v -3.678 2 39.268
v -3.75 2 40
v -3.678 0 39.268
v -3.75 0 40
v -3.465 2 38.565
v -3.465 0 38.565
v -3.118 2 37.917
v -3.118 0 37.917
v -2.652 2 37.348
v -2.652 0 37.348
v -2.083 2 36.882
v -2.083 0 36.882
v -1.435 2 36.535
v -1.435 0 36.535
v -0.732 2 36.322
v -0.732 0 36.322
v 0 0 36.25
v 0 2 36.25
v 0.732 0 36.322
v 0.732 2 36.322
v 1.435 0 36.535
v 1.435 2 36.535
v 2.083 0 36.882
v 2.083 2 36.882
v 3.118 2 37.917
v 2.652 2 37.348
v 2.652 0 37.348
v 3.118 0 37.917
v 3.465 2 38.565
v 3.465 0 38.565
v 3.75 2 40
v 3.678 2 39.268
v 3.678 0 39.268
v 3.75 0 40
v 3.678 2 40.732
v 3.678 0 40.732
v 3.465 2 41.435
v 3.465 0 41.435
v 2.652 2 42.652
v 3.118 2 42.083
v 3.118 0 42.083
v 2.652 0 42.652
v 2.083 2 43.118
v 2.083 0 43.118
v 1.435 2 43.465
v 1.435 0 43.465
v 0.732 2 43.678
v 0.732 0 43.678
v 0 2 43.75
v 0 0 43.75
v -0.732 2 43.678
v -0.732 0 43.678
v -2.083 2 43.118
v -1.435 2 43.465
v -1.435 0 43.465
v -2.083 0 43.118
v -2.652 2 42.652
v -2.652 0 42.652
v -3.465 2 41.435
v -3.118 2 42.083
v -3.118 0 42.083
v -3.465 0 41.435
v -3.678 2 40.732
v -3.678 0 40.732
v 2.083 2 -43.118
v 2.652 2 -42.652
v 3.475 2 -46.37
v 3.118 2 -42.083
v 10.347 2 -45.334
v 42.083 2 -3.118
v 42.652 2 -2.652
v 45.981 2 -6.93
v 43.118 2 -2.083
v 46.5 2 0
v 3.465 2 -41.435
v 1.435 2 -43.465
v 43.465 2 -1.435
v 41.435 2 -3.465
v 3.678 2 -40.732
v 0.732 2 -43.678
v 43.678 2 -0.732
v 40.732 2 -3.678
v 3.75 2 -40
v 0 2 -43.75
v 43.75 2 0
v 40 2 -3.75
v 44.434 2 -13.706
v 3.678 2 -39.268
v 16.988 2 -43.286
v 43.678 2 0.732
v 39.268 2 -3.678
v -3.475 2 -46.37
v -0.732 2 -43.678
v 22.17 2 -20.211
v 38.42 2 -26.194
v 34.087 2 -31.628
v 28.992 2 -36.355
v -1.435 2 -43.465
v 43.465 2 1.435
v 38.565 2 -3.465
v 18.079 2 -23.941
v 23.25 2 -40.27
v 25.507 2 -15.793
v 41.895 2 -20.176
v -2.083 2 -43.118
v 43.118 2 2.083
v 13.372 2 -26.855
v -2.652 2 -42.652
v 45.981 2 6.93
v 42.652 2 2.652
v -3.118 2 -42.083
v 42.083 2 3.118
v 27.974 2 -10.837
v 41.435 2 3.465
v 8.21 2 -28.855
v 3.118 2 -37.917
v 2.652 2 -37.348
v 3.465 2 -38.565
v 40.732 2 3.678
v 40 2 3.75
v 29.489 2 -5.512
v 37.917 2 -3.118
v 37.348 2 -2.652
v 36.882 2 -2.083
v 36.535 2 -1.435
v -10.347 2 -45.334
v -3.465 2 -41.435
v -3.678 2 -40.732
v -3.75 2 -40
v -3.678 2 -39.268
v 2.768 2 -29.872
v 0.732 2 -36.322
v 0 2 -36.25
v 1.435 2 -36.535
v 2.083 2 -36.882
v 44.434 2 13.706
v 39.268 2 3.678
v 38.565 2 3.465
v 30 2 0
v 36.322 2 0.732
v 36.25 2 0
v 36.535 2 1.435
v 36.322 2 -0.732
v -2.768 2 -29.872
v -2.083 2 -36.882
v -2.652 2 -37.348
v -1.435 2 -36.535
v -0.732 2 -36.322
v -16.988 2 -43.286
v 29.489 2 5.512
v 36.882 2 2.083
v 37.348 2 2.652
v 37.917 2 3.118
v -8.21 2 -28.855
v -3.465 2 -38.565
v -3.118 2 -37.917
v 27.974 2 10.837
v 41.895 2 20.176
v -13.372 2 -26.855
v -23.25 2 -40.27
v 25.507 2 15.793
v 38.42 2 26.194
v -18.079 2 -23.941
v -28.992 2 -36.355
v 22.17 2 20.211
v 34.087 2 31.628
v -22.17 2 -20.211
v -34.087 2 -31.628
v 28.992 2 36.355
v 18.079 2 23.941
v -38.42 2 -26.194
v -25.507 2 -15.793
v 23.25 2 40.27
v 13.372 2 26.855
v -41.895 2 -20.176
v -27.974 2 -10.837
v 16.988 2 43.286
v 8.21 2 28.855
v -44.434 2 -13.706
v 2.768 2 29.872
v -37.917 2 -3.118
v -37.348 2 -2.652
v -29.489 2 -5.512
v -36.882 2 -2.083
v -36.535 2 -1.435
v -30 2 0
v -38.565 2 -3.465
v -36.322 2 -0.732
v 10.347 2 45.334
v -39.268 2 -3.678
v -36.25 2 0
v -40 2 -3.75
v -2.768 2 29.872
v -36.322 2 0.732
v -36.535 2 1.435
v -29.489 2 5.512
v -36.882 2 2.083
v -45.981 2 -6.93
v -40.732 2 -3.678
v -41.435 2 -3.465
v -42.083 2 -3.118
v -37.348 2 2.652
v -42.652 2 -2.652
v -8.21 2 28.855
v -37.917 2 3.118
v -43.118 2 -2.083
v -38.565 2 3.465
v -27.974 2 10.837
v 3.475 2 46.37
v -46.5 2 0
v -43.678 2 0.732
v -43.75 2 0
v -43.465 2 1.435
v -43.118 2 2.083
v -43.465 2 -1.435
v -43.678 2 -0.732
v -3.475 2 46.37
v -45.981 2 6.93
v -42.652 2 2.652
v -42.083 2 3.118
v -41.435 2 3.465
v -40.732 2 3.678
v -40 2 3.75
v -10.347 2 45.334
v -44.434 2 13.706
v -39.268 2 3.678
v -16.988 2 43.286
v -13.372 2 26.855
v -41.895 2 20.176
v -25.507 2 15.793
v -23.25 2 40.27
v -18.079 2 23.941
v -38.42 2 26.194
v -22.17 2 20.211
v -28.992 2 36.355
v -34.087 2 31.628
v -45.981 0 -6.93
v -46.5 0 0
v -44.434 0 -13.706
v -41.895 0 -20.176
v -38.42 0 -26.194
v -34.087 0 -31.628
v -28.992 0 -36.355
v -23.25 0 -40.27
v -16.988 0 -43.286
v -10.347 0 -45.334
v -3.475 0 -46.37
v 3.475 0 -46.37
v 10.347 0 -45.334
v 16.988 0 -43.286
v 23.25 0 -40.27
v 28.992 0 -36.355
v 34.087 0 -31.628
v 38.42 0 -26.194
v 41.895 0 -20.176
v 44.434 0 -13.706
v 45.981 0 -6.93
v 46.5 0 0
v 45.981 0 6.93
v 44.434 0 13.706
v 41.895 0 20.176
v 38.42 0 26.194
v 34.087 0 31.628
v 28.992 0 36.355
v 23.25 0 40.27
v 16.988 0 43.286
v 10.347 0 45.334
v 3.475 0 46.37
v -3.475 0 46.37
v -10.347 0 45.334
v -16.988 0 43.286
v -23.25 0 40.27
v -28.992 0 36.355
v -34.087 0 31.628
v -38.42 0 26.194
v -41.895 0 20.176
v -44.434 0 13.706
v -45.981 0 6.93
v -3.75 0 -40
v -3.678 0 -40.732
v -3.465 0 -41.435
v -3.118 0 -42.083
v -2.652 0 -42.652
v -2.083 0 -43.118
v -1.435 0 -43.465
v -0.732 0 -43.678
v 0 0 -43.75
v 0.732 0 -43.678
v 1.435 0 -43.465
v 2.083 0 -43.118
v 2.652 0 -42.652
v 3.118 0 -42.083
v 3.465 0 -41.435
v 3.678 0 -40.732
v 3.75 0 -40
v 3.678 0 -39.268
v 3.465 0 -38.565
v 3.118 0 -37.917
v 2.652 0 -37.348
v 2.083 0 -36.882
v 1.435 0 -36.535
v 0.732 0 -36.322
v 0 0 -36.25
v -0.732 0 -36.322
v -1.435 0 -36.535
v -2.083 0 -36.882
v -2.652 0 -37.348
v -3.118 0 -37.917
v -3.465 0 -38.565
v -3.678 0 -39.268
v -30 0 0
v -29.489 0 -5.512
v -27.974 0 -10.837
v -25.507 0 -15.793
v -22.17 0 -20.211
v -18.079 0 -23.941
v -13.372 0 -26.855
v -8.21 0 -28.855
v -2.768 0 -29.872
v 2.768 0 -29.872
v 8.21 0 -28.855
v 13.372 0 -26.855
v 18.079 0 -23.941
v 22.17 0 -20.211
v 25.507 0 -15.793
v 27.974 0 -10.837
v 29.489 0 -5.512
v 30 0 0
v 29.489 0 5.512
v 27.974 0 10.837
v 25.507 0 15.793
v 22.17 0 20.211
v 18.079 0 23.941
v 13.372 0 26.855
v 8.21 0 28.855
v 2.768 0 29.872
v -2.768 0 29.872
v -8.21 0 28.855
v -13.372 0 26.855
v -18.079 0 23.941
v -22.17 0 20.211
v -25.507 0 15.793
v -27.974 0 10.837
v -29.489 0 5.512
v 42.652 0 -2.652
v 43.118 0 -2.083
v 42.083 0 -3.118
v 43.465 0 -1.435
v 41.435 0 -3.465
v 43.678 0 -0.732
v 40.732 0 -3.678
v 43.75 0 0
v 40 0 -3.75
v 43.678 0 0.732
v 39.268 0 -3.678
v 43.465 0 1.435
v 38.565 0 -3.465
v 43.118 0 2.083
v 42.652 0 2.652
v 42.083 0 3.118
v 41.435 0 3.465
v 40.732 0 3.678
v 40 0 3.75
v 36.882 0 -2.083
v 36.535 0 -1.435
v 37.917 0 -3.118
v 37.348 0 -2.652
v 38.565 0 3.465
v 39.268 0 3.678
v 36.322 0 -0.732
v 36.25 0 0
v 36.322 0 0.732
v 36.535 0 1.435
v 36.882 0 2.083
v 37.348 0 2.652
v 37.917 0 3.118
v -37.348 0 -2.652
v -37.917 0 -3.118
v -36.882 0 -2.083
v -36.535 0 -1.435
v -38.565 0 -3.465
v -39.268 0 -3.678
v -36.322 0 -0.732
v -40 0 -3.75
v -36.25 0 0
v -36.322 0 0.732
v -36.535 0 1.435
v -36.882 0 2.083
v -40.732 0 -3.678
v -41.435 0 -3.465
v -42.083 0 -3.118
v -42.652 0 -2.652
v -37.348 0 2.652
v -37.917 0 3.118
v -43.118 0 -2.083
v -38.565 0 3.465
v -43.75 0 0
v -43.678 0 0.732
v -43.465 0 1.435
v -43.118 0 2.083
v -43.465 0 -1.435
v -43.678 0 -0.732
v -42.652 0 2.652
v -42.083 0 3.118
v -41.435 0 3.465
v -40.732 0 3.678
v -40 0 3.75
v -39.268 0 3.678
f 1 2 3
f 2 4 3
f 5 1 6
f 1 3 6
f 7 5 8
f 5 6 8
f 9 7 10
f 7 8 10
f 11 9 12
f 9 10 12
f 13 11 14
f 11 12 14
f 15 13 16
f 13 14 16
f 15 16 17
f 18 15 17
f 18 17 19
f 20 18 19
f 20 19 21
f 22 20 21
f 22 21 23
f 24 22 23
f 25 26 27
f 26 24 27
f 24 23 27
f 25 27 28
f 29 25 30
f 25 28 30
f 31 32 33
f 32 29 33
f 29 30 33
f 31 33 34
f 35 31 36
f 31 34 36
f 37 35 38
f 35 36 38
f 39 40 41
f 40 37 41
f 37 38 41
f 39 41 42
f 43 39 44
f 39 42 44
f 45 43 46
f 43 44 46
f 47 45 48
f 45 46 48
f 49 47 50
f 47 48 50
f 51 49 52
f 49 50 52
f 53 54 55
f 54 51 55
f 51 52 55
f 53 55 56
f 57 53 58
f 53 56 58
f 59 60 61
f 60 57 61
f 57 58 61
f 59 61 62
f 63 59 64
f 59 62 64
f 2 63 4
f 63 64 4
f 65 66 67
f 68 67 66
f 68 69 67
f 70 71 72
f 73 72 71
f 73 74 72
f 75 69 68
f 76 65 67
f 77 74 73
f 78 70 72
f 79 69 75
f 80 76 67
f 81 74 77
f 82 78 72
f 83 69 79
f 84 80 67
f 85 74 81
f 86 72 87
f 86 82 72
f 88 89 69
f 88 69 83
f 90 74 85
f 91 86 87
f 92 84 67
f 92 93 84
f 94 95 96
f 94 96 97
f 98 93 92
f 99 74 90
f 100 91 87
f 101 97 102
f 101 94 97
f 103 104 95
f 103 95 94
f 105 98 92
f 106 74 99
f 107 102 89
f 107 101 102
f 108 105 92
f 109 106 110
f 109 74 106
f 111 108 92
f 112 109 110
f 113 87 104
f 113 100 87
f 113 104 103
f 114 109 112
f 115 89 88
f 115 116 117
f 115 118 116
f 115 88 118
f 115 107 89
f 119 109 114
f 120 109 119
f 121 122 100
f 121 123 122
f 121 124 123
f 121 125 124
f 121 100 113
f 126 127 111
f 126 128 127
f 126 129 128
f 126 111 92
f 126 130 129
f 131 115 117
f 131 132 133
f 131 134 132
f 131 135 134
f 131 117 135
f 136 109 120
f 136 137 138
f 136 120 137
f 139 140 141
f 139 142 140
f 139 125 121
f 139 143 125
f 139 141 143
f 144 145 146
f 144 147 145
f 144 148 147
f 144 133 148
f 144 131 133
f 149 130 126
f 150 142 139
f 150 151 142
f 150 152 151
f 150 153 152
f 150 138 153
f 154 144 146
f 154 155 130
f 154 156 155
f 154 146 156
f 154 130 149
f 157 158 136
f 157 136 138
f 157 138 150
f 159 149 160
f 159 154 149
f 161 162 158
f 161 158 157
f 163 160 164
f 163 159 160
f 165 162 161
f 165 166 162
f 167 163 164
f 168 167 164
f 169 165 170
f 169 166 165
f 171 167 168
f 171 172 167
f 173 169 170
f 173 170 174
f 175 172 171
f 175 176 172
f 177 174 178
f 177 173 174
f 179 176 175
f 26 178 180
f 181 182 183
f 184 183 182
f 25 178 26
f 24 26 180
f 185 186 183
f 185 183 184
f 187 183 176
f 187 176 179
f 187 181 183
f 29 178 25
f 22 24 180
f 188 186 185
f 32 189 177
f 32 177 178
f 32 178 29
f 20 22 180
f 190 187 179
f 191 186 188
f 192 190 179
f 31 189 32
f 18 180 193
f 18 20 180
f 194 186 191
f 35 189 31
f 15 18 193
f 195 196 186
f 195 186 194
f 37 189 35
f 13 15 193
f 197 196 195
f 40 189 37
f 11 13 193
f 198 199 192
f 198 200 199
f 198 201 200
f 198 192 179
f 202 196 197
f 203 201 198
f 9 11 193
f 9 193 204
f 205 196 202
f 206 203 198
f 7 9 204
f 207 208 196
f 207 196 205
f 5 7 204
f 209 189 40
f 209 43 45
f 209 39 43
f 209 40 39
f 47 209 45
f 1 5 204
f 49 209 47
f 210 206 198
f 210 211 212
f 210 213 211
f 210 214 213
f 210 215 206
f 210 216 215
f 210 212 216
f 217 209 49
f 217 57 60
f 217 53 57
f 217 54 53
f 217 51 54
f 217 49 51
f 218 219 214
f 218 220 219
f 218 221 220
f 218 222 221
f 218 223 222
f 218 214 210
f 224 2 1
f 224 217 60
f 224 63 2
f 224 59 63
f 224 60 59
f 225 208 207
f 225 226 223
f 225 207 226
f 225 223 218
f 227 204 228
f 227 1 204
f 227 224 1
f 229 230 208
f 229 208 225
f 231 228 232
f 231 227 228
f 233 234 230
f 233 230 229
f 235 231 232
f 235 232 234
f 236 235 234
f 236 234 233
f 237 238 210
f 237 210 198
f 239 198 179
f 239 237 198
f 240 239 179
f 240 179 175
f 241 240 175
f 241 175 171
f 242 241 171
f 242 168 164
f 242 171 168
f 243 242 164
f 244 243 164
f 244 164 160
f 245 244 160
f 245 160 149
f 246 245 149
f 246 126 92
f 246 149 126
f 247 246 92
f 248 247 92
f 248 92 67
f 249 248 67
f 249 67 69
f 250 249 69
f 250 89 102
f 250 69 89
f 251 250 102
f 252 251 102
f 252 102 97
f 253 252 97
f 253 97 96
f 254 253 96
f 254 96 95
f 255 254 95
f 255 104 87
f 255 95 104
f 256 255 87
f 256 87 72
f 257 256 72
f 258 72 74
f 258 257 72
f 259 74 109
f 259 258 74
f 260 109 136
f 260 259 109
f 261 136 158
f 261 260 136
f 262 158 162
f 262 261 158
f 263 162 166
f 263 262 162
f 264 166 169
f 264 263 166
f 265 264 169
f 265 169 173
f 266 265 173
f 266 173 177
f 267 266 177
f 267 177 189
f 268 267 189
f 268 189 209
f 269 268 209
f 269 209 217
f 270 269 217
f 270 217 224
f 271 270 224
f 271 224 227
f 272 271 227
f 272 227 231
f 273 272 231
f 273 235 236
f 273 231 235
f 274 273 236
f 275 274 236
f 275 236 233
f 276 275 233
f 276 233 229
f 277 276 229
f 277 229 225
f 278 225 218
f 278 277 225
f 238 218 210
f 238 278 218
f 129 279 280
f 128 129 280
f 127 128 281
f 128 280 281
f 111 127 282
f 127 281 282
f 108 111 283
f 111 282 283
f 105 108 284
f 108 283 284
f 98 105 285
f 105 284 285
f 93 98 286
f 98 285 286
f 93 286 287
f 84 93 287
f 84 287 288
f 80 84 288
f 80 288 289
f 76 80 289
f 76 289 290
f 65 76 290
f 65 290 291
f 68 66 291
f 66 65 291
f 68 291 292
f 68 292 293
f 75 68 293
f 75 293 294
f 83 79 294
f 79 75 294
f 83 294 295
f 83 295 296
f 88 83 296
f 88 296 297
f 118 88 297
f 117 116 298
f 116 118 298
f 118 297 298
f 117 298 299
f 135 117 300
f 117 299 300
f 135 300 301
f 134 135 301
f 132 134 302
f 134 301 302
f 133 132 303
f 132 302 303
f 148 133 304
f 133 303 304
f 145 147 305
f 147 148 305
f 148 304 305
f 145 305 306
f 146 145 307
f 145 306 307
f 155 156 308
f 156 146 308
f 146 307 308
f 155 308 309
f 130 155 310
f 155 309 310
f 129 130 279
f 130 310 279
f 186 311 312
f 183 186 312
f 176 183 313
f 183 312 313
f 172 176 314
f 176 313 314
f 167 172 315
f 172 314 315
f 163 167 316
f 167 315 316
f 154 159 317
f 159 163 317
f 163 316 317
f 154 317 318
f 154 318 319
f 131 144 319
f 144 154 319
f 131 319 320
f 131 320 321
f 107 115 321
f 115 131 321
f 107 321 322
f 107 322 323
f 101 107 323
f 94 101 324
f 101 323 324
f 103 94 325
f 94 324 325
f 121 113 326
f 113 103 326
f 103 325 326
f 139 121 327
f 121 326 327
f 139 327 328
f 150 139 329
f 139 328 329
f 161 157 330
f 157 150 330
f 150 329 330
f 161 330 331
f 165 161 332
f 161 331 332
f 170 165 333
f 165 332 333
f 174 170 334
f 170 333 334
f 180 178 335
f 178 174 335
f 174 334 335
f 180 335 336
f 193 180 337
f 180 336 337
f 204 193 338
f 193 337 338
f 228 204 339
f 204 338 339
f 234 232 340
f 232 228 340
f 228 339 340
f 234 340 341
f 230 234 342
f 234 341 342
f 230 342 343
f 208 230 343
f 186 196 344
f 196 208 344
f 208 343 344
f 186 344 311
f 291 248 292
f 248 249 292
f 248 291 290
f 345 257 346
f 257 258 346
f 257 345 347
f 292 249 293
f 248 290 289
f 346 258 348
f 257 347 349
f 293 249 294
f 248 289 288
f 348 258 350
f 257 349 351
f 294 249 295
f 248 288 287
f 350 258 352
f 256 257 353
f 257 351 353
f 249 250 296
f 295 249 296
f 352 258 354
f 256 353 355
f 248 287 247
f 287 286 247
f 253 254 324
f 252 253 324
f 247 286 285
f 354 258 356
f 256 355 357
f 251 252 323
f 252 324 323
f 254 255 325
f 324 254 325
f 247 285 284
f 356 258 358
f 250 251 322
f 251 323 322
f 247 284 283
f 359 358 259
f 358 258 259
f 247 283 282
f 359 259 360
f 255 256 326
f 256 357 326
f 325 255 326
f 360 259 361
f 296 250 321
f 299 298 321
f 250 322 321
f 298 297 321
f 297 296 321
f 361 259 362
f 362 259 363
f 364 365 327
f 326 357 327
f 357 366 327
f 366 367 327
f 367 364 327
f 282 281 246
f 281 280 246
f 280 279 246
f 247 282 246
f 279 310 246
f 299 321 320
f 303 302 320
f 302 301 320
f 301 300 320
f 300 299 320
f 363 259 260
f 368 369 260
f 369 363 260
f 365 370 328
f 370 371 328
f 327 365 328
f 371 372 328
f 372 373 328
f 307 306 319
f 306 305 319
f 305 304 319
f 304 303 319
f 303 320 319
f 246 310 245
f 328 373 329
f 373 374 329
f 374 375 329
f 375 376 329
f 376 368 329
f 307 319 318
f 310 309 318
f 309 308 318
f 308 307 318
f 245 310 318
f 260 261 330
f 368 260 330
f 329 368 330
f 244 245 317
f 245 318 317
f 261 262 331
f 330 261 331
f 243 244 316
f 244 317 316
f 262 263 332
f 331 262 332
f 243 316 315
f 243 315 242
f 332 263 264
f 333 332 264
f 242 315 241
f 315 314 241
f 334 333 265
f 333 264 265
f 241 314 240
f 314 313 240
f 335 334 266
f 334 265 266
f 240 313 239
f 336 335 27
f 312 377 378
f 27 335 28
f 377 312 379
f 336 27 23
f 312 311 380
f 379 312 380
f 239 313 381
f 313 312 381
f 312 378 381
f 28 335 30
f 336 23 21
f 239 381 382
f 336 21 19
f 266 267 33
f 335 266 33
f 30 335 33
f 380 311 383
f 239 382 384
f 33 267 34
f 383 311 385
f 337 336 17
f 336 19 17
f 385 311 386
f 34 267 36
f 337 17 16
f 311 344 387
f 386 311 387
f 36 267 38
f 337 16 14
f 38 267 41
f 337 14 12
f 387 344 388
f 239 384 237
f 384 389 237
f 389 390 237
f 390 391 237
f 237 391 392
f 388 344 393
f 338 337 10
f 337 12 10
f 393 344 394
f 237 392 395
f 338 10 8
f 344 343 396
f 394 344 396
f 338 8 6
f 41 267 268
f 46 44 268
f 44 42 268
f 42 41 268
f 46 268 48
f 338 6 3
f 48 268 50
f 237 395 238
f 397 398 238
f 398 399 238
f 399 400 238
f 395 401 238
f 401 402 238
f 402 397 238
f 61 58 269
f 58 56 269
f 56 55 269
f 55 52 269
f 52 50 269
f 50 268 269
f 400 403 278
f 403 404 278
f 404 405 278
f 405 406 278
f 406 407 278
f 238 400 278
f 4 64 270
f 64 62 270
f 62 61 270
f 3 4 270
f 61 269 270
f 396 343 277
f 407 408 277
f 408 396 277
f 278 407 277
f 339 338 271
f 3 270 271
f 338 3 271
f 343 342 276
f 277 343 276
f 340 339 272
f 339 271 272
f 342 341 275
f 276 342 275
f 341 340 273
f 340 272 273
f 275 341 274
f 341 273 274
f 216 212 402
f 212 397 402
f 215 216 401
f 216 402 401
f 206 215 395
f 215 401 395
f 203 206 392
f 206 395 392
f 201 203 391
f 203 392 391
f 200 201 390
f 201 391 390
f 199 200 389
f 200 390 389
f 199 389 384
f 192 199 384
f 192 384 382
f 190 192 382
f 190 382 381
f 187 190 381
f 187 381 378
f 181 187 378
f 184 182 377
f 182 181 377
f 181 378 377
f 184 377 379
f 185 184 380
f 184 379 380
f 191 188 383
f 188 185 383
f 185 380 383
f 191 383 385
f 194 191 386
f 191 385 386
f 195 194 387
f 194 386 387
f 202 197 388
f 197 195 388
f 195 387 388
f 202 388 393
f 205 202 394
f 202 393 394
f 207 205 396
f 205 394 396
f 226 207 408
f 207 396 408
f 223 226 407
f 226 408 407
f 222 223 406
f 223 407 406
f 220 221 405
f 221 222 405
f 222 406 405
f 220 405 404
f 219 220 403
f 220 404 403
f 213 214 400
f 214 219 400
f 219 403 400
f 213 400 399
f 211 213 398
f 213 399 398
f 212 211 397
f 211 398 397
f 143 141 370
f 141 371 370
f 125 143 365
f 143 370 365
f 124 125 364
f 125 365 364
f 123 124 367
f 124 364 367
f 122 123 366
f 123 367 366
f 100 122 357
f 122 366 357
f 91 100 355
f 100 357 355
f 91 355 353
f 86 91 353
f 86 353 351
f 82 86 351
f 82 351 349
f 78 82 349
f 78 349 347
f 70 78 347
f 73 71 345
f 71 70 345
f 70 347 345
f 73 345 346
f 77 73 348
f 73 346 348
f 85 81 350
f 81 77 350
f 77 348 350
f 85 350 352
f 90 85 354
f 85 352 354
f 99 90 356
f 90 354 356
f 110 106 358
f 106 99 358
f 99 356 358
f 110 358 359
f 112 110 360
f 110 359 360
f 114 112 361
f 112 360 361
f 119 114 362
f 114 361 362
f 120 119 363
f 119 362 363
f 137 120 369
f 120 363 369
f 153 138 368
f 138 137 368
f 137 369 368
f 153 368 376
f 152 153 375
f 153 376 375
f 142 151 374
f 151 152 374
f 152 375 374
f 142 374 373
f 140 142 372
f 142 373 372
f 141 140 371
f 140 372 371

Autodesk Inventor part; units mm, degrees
ref_plane "YZ Plane" through (0, 0, 0) normal (1, 0, 0) x (0, 1, 0)
ref_plane "XZ Plane" through (0, 0, 0) normal (0, 1, 0) x (-1, 0, 0)
ref_plane "XY Plane" through (0, 0, 0) normal (0, 0, 1) x (1, 0, 0)
sketch "Sketch1" plane through (0, 0, 0) normal (0, 1, 0) x (-1, 0, 0)
  circle A0 centre (0, 0) radius 52.7 construction
  circle A1 centre (0, 0) radius 55 construction
  circle A2 centre (0, 0) radius 57 construction
  circle A3 centre (0, 0) radius 30
  circle A4 centre (0, 0) radius 46.5
  circle A5 centre (0, 0) radius 40 construction
  circle A6 centre (40, 0) radius 3.75
  circle A7 centre (0, -40) radius 3.75
  circle A8 centre (-40, 0) radius 3.75
  circle A9 centre (0, 40) radius 3.75
  dimension "d0" = 105.4
  dimension "d1" = 110
  dimension "d2" = 114
  dimension "d3" = 60
  dimension "d4" = 93
  dimension "d5" = 80
  dimension "d6" = 7.5
  dimension "d7" = 7.5
  dimension "d8" = 7.5
  dimension "d9" = 7.5
extrude "Extrusion1" add sketch "Sketch1" along normal blind 2
properties part number "BiggerFanFlange"
